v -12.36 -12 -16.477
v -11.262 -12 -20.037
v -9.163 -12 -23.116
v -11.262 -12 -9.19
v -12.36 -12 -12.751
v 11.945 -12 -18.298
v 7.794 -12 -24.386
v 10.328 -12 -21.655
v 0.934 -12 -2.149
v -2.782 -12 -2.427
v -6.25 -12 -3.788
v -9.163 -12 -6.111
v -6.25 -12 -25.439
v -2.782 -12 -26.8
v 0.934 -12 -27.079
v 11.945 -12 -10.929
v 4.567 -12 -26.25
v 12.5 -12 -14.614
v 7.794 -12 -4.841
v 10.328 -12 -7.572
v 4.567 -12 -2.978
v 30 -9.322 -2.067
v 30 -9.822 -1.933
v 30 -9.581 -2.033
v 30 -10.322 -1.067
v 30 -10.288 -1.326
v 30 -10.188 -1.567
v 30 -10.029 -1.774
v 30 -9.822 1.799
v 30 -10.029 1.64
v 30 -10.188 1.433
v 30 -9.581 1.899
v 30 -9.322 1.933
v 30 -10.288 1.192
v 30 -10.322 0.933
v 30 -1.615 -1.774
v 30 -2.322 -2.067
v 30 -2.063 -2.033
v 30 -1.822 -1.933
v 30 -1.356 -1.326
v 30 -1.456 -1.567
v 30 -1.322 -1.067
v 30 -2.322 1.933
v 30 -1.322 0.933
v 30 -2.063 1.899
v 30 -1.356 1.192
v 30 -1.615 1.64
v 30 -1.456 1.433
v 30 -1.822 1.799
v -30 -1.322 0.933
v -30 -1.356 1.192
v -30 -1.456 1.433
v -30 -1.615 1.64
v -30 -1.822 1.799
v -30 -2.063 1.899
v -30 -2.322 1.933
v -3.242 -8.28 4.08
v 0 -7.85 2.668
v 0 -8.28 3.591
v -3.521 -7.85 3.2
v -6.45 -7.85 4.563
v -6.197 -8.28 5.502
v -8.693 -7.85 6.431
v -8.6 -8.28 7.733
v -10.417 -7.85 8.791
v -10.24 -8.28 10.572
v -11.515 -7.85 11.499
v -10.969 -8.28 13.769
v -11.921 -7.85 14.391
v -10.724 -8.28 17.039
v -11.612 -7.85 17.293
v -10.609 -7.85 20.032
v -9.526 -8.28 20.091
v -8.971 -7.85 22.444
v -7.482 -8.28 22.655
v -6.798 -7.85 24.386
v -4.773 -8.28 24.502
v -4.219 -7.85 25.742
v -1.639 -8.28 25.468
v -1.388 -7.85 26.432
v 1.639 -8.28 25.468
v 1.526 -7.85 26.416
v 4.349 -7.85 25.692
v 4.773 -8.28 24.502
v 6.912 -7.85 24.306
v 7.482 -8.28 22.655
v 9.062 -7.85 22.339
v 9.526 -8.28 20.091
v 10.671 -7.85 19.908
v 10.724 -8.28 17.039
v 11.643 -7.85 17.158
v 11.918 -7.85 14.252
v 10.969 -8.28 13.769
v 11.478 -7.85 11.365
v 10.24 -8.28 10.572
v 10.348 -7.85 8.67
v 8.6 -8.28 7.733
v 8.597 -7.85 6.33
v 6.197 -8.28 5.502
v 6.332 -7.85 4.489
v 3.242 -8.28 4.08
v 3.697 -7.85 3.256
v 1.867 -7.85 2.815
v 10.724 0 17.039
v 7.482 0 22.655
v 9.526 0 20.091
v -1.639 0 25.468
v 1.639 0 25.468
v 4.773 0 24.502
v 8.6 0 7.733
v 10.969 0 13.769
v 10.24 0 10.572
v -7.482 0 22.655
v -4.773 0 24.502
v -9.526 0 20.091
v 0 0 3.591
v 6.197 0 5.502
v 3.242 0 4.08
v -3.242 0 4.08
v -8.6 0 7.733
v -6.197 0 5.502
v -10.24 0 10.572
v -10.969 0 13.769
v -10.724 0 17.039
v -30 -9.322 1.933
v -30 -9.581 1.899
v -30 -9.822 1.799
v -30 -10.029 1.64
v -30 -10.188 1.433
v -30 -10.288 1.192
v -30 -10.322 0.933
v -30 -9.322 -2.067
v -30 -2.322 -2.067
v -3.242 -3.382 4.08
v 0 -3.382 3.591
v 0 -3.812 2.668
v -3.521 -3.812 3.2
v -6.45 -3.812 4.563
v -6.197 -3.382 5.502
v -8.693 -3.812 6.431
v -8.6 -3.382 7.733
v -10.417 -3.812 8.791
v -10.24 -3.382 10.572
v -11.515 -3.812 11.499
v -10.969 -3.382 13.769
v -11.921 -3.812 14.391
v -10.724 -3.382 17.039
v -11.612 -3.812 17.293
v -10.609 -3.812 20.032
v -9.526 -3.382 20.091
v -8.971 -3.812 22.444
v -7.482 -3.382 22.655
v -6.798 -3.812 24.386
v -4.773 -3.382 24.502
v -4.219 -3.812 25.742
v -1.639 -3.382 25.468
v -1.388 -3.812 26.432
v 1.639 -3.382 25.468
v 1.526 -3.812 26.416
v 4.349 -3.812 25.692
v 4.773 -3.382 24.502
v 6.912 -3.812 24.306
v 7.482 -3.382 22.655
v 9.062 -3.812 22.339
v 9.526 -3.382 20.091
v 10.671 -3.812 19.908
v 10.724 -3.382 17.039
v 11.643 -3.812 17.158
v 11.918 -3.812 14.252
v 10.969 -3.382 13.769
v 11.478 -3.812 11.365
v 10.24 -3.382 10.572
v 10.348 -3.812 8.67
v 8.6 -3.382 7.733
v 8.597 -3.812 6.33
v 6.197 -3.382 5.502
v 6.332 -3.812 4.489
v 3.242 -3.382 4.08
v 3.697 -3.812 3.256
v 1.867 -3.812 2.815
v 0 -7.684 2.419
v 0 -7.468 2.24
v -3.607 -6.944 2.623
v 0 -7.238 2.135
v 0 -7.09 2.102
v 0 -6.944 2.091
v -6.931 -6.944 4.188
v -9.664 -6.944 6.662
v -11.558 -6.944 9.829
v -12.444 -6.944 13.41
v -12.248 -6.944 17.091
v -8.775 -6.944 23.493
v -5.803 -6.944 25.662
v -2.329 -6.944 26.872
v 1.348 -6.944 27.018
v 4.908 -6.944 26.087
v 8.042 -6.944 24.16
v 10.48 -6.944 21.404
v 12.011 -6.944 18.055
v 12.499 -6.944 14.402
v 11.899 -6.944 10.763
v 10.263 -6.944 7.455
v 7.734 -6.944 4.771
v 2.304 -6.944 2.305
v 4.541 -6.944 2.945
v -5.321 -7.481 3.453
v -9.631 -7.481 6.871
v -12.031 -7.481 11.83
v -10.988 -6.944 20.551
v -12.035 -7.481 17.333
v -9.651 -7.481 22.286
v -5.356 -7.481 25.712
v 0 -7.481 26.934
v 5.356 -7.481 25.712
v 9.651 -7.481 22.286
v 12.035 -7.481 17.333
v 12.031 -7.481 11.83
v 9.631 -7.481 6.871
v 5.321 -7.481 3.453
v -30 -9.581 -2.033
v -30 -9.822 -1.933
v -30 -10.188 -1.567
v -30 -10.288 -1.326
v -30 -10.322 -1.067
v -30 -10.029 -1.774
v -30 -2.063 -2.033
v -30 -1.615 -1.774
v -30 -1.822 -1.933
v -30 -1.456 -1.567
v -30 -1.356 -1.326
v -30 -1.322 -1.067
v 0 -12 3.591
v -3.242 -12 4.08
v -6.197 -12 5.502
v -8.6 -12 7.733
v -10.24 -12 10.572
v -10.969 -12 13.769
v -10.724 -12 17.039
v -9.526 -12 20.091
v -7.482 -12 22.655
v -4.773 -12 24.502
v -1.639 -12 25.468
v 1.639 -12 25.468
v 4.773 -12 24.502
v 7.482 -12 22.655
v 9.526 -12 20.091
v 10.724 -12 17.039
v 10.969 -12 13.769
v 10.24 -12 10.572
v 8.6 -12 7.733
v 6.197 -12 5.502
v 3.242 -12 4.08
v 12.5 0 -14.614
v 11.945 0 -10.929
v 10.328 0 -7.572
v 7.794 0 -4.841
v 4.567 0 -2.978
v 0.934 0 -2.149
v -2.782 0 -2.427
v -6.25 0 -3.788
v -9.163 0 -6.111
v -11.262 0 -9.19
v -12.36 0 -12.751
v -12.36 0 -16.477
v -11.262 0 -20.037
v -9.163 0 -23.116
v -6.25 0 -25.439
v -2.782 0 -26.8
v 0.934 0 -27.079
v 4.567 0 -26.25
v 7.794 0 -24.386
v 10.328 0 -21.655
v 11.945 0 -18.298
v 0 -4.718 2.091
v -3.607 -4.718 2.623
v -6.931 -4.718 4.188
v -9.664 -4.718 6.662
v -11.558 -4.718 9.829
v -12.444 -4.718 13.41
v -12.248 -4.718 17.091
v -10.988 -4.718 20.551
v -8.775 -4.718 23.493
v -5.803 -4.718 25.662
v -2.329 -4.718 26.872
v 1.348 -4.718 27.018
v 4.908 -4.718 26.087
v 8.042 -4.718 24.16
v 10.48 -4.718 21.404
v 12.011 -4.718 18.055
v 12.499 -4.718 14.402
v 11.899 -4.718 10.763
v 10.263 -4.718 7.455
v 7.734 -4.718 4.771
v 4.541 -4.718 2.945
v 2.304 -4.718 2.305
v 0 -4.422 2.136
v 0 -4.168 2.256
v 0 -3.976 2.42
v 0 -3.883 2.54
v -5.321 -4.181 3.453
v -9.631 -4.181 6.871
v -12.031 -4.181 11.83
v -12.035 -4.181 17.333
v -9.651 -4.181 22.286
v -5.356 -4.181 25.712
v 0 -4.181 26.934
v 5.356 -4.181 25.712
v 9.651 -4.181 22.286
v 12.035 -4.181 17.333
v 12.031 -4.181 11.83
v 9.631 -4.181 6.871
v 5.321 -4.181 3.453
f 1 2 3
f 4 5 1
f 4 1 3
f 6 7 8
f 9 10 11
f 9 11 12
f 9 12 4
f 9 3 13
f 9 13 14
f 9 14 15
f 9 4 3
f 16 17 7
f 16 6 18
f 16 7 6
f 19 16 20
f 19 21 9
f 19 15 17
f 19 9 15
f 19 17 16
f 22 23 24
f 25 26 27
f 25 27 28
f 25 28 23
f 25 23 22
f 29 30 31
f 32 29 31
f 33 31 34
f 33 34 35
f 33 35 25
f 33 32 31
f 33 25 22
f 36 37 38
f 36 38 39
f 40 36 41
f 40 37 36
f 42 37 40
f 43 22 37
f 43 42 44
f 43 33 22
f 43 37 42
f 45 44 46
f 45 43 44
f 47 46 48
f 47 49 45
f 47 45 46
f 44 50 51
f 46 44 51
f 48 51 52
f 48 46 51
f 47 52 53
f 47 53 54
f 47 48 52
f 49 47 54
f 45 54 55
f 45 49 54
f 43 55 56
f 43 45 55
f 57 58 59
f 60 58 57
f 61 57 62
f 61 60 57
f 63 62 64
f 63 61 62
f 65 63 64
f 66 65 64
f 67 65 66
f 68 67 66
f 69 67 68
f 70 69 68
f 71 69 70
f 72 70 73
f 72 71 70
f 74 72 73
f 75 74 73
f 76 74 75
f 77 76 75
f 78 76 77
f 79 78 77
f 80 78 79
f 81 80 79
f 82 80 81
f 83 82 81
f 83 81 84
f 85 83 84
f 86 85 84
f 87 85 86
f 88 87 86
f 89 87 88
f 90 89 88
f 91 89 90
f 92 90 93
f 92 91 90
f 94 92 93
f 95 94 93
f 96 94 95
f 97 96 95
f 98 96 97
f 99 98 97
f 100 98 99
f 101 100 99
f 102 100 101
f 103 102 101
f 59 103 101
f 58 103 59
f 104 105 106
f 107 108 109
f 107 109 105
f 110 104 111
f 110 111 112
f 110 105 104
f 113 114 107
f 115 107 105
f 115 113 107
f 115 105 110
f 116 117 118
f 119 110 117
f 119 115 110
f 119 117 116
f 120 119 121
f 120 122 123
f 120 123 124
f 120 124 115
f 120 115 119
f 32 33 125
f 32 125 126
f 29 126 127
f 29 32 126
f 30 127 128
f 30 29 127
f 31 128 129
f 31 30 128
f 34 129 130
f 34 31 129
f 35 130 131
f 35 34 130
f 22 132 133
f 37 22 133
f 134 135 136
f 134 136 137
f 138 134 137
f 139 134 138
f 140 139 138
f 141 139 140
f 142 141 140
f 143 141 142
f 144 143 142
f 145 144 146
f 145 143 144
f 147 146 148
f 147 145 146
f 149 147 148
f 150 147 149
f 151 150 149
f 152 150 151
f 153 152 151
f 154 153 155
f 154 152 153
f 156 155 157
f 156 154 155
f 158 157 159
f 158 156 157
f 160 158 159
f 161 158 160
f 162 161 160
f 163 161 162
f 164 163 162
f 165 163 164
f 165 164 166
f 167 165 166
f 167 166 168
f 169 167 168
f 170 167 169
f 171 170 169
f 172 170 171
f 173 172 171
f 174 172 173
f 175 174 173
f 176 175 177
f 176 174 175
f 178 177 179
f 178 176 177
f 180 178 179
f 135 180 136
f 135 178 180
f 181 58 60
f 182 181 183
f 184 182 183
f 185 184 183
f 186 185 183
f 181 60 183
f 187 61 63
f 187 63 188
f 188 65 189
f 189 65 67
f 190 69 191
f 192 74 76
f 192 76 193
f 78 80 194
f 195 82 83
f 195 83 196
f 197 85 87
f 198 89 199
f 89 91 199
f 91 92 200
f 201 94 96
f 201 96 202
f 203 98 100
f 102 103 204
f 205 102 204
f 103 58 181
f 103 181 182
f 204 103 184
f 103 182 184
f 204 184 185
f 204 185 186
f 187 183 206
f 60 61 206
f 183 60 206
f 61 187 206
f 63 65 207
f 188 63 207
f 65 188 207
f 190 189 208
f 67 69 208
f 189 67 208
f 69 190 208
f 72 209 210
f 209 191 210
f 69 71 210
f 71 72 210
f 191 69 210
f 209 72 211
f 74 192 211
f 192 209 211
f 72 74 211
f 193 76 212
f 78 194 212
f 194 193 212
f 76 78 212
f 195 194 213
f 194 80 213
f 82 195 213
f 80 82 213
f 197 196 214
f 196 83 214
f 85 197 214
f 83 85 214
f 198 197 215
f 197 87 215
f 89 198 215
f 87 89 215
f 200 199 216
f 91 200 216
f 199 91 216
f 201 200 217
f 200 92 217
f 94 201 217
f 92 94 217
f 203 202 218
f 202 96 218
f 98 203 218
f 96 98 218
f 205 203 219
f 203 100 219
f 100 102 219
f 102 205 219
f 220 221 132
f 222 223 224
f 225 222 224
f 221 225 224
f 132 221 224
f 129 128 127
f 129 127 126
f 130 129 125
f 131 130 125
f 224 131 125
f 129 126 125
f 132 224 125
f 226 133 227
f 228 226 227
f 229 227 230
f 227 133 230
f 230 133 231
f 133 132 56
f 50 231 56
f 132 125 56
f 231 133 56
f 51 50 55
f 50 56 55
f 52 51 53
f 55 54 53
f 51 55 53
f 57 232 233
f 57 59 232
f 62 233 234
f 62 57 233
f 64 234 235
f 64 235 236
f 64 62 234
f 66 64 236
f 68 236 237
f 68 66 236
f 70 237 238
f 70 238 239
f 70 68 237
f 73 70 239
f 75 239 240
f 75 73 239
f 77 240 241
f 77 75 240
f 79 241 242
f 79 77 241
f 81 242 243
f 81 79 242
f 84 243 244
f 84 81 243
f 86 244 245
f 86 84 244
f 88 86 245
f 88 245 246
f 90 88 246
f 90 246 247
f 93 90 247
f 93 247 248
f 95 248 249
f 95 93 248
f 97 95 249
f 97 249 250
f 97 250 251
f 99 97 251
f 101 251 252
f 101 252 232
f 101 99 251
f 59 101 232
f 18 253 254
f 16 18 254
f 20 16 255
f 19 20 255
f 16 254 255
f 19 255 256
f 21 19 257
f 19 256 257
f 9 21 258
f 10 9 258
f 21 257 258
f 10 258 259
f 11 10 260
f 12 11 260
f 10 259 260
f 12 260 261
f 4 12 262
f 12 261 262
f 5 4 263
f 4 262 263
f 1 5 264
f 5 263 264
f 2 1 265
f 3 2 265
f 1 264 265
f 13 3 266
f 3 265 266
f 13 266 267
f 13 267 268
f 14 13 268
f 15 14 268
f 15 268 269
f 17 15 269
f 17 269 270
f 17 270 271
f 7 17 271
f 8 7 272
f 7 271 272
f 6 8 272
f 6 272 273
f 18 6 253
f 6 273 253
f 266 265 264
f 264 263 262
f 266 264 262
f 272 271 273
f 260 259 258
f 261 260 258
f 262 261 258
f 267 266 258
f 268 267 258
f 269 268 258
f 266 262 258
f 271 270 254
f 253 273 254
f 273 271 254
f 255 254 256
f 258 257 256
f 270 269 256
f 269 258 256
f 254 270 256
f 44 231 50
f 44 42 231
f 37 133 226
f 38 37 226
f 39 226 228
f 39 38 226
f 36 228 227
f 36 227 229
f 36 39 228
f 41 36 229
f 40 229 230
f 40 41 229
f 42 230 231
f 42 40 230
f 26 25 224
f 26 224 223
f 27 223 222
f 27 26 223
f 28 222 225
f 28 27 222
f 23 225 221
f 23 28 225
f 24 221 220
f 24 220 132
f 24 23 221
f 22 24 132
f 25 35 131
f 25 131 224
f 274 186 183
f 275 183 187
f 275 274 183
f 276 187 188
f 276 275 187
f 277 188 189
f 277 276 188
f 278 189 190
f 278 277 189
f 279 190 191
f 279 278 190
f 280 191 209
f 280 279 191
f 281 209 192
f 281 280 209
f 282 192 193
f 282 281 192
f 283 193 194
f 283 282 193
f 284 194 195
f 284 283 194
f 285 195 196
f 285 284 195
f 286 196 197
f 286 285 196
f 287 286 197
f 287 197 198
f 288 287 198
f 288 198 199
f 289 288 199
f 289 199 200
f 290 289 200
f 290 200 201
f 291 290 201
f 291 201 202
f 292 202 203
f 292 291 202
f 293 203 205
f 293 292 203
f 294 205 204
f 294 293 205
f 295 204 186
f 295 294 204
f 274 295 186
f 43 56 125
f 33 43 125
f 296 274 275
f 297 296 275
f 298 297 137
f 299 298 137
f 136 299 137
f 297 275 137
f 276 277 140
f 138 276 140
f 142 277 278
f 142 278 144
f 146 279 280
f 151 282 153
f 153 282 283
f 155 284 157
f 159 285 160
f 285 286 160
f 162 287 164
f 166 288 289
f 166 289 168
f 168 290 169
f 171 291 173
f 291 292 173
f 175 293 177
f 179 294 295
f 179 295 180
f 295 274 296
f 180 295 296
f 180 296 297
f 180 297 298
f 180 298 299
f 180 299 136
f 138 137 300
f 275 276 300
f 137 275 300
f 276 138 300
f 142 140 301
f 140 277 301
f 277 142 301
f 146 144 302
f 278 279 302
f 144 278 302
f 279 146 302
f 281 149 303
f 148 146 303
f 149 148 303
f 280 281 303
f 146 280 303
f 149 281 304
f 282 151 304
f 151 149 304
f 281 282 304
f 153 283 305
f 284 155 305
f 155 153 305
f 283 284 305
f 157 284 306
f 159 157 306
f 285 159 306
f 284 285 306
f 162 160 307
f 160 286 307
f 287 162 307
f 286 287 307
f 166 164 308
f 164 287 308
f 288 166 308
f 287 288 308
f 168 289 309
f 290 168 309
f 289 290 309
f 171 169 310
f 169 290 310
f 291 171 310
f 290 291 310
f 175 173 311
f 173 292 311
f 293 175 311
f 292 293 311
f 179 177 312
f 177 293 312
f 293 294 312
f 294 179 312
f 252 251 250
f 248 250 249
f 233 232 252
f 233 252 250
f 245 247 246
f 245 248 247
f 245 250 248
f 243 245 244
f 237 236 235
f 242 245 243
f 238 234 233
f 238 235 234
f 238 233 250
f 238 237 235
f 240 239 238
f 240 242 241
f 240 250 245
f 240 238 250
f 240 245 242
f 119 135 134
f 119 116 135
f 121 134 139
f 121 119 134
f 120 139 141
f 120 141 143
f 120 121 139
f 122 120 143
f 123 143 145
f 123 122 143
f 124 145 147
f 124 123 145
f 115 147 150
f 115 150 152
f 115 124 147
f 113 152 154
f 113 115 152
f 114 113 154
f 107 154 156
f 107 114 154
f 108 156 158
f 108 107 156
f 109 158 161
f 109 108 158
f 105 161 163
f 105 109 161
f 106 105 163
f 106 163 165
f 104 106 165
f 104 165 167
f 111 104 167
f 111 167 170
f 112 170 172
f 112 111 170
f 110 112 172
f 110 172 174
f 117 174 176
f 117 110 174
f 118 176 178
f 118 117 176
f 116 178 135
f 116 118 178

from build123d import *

# Parameters (mm, degrees)
F2_DEPTH = 30
F0_R     = 12.5
F3_DEPTH = 12
F6_R     = 1
F7_R     = 1


with BuildPart() as f2:
    # F1 (on Right) → F2 (new body, symmetric)
    with BuildSketch(Plane.YZ):
        with BuildLine():
            Line((-2.3217727498, 1.9332754826), (-9.3217727498, 1.9332754826))
            ThreePointArc((-9.3217727498, 1.9332754826), (-10.0288795309, 1.6403822638), (-10.3217727498, 0.9332754826))
            Line((-10.3217727498, 0.9332754826), (-10.3217727498, -1.0667245174))
            ThreePointArc((-10.3217727498, -1.0667245174), (-10.0288795309, -1.7738312986), (-9.3217727498, -2.0667245174))
            Line((-9.3217727498, -2.0667245174), (-2.3217727498, -2.0667245174))
            ThreePointArc((-2.3217727498, -2.0667245174), (-1.6146659686, -1.7738312986), (-1.3217727498, -1.0667245174))
            Line((-1.3217727498, -1.0667245174), (-1.3217727498, 0.9332754826))
            ThreePointArc((-1.3217727498, 0.9332754826), (-1.6146659686, 1.6403822638), (-2.3217727498, 1.9332754826))
        make_face()
    extrude(amount=F2_DEPTH, both=True)


with BuildPart() as f3:
    # F0 (on Front) → F3 (new body)
    with BuildSketch(Plane.XZ):
        with Locations((0, -14.6136025154)):
            Circle(F0_R)
    extrude(amount=F3_DEPTH)


with BuildPart() as f5:
    # F4 (on Right) → F5 (revolve)
    with BuildSketch(Plane.YZ):
        Polygon((0, 3.5909637578), (0, 14.5909637578), (-12, 14.5909637578), (-12, 3.5909637578), (-8.2804769289, 3.5909637578), (-7.5810154416, 2.0909637578), (-4.0810154416, 2.0909637578), (-3.3815539544, 3.5909637578), align=None)
    revolve(axis=Axis((0, -6, 14.5909637578), (0, 1, 0)))

    # F6
    f6_edges = [f5.edges().sort_by_distance(p)[0] for p in [
        (0, -7.581015, 27.090964),
    ]]
    fillet(f6_edges, radius=F6_R)

    # F7
    f7_edges = [f5.edges().sort_by_distance(p)[0] for p in [
        (0, -4.081015, 27.090964),
    ]]
    fillet(f7_edges, radius=F7_R)


solid = Compound([f2.part, f3.part, f5.part])
